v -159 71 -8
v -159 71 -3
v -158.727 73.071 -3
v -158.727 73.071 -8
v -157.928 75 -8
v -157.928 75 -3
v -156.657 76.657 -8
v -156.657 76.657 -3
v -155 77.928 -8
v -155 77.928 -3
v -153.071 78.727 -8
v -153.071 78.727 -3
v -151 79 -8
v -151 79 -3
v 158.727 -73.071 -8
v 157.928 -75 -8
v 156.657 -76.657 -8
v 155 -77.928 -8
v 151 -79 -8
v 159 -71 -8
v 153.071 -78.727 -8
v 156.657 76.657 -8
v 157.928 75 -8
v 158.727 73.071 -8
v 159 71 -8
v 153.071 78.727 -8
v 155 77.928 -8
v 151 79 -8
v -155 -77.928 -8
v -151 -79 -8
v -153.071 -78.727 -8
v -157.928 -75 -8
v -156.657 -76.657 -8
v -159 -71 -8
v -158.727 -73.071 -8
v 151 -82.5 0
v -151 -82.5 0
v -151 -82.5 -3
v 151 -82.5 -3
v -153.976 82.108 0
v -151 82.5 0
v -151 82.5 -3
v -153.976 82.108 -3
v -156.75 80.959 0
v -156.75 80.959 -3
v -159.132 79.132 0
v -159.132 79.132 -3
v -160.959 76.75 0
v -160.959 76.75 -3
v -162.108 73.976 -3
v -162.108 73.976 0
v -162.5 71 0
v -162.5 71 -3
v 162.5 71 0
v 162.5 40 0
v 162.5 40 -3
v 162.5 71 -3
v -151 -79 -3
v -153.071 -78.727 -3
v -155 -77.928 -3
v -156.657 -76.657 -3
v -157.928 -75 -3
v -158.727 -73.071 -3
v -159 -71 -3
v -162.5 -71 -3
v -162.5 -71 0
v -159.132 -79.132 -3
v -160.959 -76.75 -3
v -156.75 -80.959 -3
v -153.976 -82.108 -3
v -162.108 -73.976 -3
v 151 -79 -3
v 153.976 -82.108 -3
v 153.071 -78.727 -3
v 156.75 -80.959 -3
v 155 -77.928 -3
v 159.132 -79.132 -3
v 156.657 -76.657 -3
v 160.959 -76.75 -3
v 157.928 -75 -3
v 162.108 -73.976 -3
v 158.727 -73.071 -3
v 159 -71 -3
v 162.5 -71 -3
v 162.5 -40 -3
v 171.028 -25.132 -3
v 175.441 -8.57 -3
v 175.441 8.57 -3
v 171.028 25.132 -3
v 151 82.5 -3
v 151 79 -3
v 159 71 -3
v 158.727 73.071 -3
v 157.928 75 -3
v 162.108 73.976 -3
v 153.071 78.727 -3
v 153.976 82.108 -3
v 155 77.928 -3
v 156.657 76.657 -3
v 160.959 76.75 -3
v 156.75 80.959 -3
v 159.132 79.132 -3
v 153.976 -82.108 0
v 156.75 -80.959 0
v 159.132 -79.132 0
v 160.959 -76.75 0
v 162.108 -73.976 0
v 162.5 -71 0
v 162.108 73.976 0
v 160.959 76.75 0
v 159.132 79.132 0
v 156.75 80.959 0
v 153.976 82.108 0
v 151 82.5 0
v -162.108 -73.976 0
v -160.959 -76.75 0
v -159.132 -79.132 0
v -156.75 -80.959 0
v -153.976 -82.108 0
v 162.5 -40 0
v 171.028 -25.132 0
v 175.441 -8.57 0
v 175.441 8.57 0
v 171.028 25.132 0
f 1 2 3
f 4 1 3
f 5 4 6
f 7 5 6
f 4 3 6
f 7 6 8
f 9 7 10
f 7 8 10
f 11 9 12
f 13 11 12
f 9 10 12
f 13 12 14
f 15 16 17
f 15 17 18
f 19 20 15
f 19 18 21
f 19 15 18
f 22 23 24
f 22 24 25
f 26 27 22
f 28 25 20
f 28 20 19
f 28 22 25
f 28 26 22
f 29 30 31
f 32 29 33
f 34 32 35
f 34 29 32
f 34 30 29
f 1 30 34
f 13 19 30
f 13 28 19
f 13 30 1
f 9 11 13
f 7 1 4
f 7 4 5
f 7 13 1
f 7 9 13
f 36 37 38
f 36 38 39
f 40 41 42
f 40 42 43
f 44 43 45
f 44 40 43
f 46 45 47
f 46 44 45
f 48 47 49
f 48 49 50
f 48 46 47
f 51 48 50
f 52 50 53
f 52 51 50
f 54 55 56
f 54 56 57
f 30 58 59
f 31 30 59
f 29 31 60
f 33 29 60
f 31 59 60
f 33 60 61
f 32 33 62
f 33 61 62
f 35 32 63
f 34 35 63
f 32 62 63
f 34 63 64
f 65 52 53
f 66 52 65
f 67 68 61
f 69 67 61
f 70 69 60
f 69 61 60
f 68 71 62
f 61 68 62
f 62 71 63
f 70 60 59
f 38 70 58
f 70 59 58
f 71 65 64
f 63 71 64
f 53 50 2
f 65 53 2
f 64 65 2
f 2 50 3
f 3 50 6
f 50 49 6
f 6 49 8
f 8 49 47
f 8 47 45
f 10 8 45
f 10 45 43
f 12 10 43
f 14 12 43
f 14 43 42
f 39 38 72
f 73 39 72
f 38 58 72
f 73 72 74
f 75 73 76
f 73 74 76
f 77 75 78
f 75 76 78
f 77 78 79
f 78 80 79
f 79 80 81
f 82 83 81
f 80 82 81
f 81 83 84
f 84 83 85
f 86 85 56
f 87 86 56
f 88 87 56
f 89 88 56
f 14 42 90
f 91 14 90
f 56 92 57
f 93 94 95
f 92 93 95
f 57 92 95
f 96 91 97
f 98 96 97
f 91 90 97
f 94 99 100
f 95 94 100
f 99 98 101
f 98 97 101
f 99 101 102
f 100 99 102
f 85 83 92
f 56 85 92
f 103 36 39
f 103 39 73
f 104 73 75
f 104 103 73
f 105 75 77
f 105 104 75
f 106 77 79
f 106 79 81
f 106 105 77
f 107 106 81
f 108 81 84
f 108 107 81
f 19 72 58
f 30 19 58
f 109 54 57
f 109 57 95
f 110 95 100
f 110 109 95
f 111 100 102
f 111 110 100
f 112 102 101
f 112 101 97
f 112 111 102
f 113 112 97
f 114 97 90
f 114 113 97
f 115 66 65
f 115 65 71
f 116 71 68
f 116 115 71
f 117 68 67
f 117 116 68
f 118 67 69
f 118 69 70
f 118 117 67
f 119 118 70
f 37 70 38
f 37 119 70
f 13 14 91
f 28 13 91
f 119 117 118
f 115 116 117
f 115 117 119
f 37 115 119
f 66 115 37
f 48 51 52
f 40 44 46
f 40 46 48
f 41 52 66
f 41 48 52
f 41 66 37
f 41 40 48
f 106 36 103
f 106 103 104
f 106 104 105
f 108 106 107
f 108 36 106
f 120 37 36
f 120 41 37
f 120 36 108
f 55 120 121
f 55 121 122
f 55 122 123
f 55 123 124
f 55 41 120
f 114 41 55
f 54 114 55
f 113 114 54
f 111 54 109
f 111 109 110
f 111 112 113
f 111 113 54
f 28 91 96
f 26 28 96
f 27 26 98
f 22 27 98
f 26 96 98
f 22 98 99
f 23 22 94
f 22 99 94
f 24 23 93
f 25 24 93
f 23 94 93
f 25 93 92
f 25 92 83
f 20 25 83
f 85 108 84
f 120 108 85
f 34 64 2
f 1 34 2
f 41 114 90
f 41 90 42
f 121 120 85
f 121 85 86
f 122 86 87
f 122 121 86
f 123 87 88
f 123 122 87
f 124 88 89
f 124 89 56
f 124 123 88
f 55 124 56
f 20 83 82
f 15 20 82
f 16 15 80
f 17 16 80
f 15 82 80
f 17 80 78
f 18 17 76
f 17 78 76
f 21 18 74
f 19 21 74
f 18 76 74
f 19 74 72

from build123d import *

# Parameters (mm, degrees)
BOSS_EXTRUDE2_DEPTH = 3
EXTRUDE_1_DEPTH     = 5
EXTRUDE_2_DEPTH     = 3


with BuildPart() as part:
    # Sketch3 → Boss-Extrude2 (new body)
    with BuildSketch(Plane.XY):
        with BuildLine():
            Line((-151, 81), (151, 81))
            ThreePointArc((151, 81), (158.071067812, 78.071067812), (161, 71))
            Line((161, 71), (161, -71))
            ThreePointArc((161, -71), (158.071067812, -78.071067812), (151, -81))
            Line((151, -81), (-151, -81))
            ThreePointArc((-151, -81), (-158.071067812, -78.071067812), (-161, -71))
            Line((-161, -71), (-161, 71))
            ThreePointArc((-161, 71), (-158.071067812, 78.071067812), (-151, 81))
        make_face()
    extrude(amount=-BOSS_EXTRUDE2_DEPTH)

    # Эскиз1 → Бобышка-Вытянуть1 (add)
    with BuildSketch(Plane(origin=(0, 0, -3), x_dir=(-1, 0, 0), z_dir=(0, 0, -1))):
        with BuildLine():
            Line((-151, -79), (151, -79))
            ThreePointArc((151, -79), (156.656854249, -76.656854249), (159, -71))
            Line((159, -71), (159, 71))
            ThreePointArc((159, 71), (156.656854249, 76.656854249), (151, 79))
            Line((151, 79), (-151, 79))
            ThreePointArc((-151, 79), (-156.656854249, 76.656854249), (-159, 71))
            Line((-159, 71), (-159, -71))
            ThreePointArc((-159, -71), (-156.656854249, -76.656854249), (-151, -79))
        make_face()
    extrude(amount=EXTRUDE_1_DEPTH)

    # Эскиз2 → Бобышка-Вытянуть2 (add)
    with BuildSketch(Plane.XY):
        with BuildLine():
            Line((162.5, 40), (162.5, 71))
            ThreePointArc((162.5, 71), (159.131727984, 79.131727984), (151, 82.5))
            Line((151, 82.5), (-151, 82.5))
            ThreePointArc((-151, 82.5), (-159.131727984, 79.131727984), (-162.5, 71))
            Line((-162.5, 71), (-162.5, -71))
            ThreePointArc((-162.5, -71), (-159.131727984, -79.131727984), (-151, -82.5))
            Line((-151, -82.5), (151, -82.5))
            ThreePointArc((151, -82.5), (159.131727984, -79.131727984), (162.5, -71))
            Line((162.5, -71), (162.5, -40))
            ThreePointArc((162.5, -40), (176, 0), (162.5, 40))
        make_face()
    extrude(amount=-EXTRUDE_2_DEPTH)


solid = part.part
